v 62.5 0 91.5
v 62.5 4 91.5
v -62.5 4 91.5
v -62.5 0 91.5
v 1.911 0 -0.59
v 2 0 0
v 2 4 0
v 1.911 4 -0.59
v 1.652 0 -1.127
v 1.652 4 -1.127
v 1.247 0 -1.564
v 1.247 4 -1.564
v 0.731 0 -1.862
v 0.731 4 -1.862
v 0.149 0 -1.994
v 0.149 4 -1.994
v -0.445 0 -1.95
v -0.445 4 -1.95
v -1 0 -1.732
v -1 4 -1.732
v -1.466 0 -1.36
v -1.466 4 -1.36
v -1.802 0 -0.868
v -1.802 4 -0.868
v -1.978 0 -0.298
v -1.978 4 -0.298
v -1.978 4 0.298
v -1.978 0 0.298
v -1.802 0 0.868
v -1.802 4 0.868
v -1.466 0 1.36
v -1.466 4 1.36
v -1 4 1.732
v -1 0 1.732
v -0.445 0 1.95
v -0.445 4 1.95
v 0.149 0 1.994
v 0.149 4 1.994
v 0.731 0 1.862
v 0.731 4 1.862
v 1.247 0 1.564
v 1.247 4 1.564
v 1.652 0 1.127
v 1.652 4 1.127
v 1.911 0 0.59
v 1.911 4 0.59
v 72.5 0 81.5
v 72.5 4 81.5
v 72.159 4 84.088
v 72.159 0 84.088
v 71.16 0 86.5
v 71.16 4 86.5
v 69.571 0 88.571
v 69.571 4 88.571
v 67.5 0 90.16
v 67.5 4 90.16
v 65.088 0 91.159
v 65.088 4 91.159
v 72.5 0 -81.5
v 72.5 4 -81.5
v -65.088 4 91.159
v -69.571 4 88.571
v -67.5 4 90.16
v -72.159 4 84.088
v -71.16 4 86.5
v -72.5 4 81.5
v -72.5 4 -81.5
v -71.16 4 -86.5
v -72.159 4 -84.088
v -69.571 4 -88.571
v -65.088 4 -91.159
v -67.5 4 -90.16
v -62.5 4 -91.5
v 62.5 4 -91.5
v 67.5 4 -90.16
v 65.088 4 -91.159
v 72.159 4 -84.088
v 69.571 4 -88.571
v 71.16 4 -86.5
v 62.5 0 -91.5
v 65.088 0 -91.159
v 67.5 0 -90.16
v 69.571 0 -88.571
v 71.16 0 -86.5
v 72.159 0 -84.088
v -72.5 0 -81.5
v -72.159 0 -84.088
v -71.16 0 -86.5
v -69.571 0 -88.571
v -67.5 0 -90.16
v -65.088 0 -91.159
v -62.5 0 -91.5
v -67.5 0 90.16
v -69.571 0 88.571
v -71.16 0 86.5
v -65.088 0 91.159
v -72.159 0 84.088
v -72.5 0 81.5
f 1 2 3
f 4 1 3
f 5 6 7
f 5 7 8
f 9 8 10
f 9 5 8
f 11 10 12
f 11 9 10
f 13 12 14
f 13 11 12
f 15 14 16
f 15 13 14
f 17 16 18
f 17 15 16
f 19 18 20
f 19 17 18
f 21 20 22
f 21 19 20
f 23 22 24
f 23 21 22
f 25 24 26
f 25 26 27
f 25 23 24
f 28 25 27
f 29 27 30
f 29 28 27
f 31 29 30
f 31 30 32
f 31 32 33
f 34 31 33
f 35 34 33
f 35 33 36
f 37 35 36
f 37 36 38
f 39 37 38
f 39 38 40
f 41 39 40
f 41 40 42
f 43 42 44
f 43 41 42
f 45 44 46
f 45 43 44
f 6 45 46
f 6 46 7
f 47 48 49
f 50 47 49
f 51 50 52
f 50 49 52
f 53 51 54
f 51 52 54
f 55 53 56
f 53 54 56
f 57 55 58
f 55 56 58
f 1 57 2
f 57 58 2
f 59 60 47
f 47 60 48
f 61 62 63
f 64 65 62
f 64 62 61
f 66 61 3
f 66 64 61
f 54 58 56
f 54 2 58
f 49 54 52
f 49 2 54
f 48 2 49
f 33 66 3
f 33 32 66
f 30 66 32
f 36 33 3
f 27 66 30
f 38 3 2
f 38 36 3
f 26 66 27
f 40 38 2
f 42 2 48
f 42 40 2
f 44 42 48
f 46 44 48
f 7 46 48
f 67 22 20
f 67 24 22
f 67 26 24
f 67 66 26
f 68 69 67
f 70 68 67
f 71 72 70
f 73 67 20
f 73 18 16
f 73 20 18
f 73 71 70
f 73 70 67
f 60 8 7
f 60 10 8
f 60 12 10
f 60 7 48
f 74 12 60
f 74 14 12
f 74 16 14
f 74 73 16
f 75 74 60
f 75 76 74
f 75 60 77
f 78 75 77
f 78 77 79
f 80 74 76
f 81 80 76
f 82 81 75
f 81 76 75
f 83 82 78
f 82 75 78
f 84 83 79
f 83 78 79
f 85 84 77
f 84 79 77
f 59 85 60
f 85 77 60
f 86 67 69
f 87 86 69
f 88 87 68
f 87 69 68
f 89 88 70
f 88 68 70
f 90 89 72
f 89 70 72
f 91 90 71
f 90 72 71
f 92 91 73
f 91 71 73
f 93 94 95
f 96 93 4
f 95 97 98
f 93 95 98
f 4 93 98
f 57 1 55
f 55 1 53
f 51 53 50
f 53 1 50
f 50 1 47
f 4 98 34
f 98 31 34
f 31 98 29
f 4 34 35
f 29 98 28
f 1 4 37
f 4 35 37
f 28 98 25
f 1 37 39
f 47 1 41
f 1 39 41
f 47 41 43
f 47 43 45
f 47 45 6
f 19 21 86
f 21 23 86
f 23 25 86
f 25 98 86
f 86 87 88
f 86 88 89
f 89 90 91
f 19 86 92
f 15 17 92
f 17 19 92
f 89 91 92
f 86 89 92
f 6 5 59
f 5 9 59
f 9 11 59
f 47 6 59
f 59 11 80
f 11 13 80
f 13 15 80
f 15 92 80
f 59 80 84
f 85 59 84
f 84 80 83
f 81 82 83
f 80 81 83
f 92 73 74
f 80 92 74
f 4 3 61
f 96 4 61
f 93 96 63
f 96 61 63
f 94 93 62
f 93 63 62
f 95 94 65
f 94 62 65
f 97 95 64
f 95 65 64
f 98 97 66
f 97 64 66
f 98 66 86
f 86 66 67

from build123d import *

# Parameters (mm, degrees)
SKETCH1_W           = 200
SKETCH1_H           = 200
SKETCH1_R           = 2
BOSS_EXTRUDE1_DEPTH = 4
FILLET1_R           = 10
SKETCH2_W           = 332.366301243
SKETCH2_H           = 358.749780036
CUT_EXTRUDE1_DEPTH  = 10


with BuildPart() as part:
    # Sketch1 → Boss-Extrude1 (new body)
    with BuildSketch(Plane(origin=(0, 0, 0), x_dir=(1, 0, 0), z_dir=(0, 1, 0))):
        Rectangle(SKETCH1_W, SKETCH1_H)
        Circle(SKETCH1_R, mode=Mode.SUBTRACT)
    extrude(amount=BOSS_EXTRUDE1_DEPTH)

    # Fillet1
    fillet1_edges = [part.edges().sort_by_distance(p)[0] for p in [
        (-100, 2, -100),
        (100, 2, -100),
        (100, 2, 100),
        (-100, 2, 100),
    ]]
    fillet(fillet1_edges, radius=FILLET1_R)

    # Sketch2 → Cut-Extrude1 (cut)
    with BuildSketch(Plane(origin=(0, 4, 0), x_dir=(1, 0, 0), z_dir=(0, 1, 0))):
        with Locations((1.781411531, 2.248264207)):
            Rectangle(SKETCH2_W, SKETCH2_H)
        with BuildLine():
            Line((-62.5, 91.5), (62.5, 91.5))
            ThreePointArc((62.5, 91.5), (69.571067812, 88.571067812), (72.5, 81.5))
            Line((72.5, 81.5), (72.5, -81.5))
            ThreePointArc((72.5, -81.5), (69.571067812, -88.571067812), (62.5, -91.5))
            Line((62.5, -91.5), (-62.5, -91.5))
            ThreePointArc((-62.5, -91.5), (-69.571067812, -88.571067812), (-72.5, -81.5))
            Line((-72.5, -81.5), (-72.5, 81.5))
            ThreePointArc((-72.5, 81.5), (-69.571067812, 88.571067812), (-62.5, 91.5))
        make_face(mode=Mode.SUBTRACT)
    extrude(amount=-CUT_EXTRUDE1_DEPTH, mode=Mode.SUBTRACT)


solid = part.part
